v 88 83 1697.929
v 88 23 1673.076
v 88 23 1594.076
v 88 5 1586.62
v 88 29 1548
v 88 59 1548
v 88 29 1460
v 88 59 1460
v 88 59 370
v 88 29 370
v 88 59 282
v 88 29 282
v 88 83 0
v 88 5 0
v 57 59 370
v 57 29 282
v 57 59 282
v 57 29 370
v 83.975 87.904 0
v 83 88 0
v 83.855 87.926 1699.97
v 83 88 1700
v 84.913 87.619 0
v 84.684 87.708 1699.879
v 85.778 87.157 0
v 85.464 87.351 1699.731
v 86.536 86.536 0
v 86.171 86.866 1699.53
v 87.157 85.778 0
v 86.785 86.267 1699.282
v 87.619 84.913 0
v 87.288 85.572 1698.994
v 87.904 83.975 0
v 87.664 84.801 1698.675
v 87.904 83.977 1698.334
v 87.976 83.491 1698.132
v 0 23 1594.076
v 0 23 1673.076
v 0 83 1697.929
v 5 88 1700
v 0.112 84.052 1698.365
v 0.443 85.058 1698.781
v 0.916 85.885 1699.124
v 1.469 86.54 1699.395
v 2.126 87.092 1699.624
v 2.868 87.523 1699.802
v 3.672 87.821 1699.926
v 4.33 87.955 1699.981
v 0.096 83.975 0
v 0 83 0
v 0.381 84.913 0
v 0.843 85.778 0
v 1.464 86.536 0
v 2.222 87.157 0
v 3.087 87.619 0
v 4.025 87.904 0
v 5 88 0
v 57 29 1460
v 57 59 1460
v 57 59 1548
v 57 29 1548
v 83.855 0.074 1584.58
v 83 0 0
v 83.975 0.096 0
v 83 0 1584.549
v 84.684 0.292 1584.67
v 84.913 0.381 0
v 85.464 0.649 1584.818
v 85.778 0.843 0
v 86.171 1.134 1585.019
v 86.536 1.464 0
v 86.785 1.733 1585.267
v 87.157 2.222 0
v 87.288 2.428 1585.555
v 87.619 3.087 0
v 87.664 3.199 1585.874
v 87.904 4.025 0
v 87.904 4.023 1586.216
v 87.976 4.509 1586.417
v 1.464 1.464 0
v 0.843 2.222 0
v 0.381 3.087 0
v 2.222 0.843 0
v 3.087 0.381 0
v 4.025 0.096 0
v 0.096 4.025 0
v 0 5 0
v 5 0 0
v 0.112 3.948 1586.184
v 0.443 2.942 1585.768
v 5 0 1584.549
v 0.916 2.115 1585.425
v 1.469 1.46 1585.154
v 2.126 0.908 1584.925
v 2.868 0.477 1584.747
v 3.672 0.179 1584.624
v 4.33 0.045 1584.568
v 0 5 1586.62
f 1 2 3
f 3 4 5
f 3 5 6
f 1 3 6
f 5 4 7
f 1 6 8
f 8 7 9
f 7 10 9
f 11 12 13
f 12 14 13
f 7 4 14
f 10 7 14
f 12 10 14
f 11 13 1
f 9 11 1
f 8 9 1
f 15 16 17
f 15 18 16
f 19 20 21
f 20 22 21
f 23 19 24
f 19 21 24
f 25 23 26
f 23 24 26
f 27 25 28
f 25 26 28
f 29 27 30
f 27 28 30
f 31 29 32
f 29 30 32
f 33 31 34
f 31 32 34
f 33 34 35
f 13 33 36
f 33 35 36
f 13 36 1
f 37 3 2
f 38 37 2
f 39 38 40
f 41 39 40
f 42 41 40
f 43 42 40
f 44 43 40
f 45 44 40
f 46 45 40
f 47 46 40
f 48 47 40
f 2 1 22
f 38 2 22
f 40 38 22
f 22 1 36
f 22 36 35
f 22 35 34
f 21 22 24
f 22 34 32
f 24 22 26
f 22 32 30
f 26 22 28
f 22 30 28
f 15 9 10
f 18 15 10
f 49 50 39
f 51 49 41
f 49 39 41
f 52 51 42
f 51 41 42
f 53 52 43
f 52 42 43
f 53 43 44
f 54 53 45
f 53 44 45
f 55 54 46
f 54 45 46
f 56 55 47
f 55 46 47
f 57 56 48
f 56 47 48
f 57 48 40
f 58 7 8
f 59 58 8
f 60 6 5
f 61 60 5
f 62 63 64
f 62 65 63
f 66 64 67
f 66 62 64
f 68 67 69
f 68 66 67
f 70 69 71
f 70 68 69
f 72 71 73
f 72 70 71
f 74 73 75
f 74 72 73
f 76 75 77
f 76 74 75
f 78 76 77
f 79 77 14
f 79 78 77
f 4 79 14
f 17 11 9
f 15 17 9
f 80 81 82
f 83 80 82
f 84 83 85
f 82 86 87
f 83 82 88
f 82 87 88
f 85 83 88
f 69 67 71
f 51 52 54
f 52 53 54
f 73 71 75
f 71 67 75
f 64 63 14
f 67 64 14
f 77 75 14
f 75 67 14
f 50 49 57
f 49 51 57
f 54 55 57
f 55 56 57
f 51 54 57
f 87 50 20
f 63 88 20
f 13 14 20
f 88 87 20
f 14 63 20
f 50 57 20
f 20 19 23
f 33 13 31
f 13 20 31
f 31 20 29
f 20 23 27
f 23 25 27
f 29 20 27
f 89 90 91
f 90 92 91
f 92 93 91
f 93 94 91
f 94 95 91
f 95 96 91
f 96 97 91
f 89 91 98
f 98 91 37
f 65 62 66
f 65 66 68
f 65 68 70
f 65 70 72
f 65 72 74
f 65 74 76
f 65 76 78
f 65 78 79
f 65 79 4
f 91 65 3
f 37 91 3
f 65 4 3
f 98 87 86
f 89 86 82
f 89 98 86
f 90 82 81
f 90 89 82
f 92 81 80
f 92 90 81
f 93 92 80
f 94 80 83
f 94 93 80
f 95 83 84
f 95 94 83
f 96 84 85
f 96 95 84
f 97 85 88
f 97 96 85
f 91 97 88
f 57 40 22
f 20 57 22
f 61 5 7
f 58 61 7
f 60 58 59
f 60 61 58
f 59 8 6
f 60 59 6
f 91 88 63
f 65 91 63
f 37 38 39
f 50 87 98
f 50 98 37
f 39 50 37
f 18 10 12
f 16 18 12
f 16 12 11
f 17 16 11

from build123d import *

# Parameters (mm, degrees)
F0_W     = 88
F0_H     = 88
F1_DEPTH = 1700
F3_DEPTH = 31
F5_DEPTH = 31
F7_DEPTH = 88.001
F9_DEPTH = 88.001
F10_R    = 5


with BuildPart() as f1:
    # F0 (on Top) → F1 (new body)
    with BuildSketch(Plane.XY):
        with Locations((44, 44)):
            Rectangle(F0_W, F0_H)
    extrude(amount=F1_DEPTH)

    # F2 (on face) → F3 (cut)
    with BuildSketch(Plane.YZ.offset(88)):
        Polygon((29, 282), (44, 282), (59, 282), (59, 370), (29, 370), align=None)
    extrude(amount=-F3_DEPTH, mode=Mode.SUBTRACT)

    # F4 (on face) → F5 (cut)
    with BuildSketch(Plane.YZ.offset(88)):
        Polygon((29, 1460), (44, 1460), (59, 1460), (59, 1548), (29, 1548), align=None)
    extrude(amount=-F5_DEPTH, mode=Mode.SUBTRACT)

    # F6 (on face) → F7 (cut, through all)
    with BuildSketch(Plane.YZ.offset(88)):
        Polygon((0, 1663.5492065112), (88, 1700), (0, 1700), align=None)
    extrude(amount=-F7_DEPTH, mode=Mode.SUBTRACT)

    # F8 (on face) → F9 (cut, through all)
    with BuildSketch(Plane.YZ.offset(88)):
        Polygon((23, 1594.0761184457), (23, 1673.0761184457), (0, 1663.5492065112), (0, 1584.5492065112), align=None)
    extrude(amount=-F9_DEPTH, mode=Mode.SUBTRACT)

    # F10
    f10_edges = [f1.edges().sort_by_distance(p)[0] for p in [
        (0, 0, 792.274603),
        (88, 0, 792.274603),
        (88, 88, 850),
        (0, 88, 850),
    ]]
    fillet(f10_edges, radius=F10_R)


solid = f1.part
